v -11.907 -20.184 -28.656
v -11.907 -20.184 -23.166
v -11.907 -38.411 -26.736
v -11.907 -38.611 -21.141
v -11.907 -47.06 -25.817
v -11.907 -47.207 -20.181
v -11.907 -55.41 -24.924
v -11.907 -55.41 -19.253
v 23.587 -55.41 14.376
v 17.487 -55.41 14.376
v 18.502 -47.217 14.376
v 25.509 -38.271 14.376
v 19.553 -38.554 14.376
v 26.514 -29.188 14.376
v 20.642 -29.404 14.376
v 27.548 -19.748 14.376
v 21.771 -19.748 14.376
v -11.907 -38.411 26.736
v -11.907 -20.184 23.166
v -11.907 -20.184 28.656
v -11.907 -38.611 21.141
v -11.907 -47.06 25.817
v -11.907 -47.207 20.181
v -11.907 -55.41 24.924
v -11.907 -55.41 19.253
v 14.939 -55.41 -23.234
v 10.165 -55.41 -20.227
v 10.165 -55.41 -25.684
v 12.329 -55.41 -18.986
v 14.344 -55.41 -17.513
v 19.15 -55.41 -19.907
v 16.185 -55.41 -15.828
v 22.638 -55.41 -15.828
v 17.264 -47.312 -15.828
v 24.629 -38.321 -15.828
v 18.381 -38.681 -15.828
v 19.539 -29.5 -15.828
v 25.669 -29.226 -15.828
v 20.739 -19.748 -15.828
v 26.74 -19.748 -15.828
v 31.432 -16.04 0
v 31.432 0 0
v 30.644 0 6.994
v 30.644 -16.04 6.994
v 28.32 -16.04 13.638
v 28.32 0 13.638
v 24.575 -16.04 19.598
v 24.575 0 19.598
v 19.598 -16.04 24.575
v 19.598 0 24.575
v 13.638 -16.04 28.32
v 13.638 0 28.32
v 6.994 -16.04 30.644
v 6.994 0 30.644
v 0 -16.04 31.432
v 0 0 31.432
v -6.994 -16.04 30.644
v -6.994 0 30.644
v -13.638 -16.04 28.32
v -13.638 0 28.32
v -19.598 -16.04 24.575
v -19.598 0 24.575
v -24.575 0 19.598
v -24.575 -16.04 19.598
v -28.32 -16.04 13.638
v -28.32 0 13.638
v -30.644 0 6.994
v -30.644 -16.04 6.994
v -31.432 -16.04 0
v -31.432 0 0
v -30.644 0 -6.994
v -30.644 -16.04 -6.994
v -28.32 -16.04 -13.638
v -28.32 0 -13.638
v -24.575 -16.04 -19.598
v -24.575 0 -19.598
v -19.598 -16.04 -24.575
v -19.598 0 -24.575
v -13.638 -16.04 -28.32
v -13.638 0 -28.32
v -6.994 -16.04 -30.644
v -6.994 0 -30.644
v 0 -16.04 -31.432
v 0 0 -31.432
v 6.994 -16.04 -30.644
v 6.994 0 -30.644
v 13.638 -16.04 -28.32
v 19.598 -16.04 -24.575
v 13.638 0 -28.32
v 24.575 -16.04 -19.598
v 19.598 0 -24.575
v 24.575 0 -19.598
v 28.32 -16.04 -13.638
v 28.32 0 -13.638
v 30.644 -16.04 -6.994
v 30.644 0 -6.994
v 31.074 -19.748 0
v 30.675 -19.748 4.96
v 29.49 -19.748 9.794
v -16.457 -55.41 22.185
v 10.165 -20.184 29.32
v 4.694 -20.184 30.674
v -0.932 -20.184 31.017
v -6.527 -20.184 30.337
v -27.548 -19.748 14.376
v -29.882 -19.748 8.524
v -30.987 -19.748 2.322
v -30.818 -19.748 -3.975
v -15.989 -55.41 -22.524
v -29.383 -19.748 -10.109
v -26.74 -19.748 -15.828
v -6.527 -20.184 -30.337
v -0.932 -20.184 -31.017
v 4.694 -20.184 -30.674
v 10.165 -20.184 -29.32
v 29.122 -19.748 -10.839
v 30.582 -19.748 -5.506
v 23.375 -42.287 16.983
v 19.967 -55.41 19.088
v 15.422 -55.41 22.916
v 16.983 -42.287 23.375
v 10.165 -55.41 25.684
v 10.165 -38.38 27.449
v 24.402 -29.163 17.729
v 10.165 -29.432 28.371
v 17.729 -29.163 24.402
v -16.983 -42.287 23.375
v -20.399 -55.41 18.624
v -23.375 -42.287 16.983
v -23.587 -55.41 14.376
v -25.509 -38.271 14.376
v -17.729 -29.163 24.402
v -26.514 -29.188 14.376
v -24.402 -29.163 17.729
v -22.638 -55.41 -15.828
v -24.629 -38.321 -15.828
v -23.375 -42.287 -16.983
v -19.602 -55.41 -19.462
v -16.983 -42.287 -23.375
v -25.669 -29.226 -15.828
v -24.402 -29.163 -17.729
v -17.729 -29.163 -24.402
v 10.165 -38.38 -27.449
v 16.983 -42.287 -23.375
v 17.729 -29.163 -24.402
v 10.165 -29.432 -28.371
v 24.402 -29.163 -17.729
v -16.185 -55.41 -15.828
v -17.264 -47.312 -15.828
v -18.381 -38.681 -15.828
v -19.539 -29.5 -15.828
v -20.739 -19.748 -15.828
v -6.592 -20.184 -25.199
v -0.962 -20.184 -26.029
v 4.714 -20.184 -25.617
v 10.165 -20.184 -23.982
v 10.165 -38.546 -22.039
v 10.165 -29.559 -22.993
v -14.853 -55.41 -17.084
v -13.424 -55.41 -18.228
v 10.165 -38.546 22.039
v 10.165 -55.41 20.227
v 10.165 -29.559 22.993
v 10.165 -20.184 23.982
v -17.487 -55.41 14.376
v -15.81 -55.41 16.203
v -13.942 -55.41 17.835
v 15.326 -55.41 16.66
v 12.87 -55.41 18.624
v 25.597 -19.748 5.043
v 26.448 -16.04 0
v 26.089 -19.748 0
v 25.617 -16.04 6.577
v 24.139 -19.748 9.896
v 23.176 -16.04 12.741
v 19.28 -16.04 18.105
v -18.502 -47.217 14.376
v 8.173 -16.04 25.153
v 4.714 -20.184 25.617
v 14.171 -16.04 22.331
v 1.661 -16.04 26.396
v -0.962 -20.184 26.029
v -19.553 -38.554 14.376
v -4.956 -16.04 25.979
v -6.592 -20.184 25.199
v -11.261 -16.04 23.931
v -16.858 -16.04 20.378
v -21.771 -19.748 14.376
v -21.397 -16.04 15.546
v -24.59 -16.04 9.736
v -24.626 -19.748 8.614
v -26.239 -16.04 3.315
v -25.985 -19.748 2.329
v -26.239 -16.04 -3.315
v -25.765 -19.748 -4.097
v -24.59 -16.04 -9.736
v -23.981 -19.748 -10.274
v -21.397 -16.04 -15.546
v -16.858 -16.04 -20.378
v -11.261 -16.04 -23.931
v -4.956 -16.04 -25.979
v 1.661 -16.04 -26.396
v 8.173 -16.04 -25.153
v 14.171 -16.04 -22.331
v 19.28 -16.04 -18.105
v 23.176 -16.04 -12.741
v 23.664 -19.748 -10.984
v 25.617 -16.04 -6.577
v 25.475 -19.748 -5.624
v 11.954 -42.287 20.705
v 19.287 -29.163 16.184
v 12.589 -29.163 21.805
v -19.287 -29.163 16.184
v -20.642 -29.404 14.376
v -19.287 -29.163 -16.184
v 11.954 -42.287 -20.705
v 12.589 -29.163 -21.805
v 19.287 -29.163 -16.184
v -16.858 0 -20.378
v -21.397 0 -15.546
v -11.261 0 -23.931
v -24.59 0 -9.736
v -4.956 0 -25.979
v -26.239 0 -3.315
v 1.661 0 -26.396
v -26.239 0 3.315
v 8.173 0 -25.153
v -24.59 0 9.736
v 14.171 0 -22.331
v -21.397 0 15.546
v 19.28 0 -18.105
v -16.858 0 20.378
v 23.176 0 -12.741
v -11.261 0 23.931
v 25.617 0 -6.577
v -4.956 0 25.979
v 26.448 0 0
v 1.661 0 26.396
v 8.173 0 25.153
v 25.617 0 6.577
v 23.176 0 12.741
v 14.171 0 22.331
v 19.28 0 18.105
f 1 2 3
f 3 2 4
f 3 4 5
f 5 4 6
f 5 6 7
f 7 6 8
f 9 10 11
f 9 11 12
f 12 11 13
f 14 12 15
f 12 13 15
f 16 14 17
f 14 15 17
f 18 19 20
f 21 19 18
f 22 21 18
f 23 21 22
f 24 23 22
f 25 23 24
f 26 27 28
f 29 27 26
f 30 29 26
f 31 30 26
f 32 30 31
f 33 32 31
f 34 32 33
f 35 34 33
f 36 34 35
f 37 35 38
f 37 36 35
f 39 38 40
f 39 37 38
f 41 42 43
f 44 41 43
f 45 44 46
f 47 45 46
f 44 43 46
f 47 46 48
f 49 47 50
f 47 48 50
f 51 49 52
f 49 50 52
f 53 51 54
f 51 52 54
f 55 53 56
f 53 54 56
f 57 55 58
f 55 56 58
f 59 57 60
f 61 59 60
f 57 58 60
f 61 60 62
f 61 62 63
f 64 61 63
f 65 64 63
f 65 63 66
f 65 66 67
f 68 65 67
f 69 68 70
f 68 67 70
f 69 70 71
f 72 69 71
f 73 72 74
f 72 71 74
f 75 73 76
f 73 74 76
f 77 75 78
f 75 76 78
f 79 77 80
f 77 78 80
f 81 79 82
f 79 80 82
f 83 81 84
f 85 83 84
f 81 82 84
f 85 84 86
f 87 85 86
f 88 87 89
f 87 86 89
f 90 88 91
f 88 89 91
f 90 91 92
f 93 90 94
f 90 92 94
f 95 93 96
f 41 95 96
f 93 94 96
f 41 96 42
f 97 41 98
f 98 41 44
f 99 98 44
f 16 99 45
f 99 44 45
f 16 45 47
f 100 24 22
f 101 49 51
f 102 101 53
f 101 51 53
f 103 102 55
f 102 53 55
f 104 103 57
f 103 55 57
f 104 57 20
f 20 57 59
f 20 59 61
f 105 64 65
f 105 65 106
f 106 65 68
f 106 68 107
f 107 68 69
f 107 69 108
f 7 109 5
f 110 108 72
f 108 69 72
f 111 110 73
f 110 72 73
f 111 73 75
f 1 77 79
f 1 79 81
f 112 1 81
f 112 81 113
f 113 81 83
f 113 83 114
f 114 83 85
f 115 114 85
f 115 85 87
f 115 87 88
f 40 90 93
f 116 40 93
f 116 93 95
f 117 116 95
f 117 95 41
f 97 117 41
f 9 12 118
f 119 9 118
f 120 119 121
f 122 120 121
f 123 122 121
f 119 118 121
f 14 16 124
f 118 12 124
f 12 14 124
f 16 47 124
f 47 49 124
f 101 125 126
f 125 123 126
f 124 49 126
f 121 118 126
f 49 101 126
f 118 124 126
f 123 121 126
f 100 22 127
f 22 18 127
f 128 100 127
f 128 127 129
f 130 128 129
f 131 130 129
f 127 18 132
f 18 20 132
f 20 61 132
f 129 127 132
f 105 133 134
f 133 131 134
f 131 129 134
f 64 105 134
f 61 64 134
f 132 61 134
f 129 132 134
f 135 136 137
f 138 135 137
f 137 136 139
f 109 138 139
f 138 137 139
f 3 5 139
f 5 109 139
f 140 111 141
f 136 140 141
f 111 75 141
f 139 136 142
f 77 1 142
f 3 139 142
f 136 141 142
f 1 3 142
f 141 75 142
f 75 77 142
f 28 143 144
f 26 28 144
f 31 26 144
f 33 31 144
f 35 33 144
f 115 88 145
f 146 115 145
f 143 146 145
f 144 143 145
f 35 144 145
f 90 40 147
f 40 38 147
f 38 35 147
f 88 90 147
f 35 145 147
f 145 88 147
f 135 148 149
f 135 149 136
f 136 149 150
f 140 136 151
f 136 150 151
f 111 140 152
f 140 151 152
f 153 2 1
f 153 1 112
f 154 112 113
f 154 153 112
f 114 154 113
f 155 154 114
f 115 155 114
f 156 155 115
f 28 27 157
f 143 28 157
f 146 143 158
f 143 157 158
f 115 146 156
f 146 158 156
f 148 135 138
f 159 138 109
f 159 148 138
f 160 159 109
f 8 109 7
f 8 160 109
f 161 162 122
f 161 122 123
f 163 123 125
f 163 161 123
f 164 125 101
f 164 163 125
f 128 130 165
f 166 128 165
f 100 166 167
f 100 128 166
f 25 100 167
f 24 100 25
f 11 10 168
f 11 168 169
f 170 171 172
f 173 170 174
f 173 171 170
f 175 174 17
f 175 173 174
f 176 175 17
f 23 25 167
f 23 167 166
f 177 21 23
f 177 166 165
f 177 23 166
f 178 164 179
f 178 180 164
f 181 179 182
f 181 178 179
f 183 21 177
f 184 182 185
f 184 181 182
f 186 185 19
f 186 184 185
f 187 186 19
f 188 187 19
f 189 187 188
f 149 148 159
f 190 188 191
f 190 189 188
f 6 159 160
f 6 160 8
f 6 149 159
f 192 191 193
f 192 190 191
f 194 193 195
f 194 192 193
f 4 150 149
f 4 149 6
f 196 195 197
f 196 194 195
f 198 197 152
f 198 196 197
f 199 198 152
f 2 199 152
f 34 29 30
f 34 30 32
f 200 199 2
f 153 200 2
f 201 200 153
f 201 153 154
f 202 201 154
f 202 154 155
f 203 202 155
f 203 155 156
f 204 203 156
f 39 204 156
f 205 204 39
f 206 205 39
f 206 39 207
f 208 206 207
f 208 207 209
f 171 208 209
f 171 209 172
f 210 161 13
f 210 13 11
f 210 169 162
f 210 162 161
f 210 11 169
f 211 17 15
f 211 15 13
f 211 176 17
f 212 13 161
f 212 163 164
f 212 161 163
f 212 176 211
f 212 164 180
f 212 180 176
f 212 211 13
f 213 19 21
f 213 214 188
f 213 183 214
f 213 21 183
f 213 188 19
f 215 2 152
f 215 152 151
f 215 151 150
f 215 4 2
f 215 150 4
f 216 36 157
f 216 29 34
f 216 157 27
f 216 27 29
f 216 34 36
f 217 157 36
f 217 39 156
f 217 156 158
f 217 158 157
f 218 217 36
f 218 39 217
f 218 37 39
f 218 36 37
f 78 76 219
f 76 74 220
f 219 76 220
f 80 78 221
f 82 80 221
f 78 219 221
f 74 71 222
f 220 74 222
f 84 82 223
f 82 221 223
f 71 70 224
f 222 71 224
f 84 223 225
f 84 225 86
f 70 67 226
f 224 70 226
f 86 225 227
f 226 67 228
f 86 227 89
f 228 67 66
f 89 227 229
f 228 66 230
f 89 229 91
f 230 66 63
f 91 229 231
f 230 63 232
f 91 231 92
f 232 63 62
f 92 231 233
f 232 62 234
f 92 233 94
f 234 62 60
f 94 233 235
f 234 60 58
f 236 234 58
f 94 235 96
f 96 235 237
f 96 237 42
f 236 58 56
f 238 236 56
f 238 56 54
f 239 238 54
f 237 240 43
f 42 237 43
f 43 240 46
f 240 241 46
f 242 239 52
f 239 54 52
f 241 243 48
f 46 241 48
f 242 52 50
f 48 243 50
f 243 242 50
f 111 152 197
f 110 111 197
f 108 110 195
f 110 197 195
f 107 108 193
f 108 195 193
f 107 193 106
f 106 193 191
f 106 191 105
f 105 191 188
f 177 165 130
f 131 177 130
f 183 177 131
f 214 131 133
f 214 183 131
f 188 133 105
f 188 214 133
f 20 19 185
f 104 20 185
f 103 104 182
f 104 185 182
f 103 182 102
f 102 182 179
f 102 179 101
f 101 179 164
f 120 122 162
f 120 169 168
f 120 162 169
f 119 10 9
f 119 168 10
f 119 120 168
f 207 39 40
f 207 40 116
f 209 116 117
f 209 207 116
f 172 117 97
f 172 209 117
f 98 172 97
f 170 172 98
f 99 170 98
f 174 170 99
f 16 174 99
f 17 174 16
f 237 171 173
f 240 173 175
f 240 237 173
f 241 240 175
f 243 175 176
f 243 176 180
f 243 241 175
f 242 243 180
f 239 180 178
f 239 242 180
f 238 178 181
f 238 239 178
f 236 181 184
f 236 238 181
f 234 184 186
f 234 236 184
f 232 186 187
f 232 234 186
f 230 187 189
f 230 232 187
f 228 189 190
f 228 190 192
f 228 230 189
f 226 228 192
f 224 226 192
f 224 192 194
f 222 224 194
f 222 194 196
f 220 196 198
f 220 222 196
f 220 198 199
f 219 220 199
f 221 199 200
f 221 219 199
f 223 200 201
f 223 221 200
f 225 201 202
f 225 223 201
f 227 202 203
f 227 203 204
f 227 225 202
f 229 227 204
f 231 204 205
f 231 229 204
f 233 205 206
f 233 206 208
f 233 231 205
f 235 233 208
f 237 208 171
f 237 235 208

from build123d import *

# Parameters (mm, degrees)
F0_R           = 26.44775
F1_DEPTH       = 55.4101
F2_SIZE2       = 39.37
F2_SIZE        = 3.81
F3_R           = 31.4325
F4_DEPTH       = 55.4101
F5_SIZE2       = 39.37
F5_SIZE        = 3.81
F7_W           = 10.4550290853
F7_H           = 15.8277489245
F7_H_2         = 14.3756624311
F8_DEPTH       = 43.9235
F8_DEPTH_BACK  = 42.42753
F9_W           = 22.0717256889
F9_H           = 9.8741929978
F9_H_2         = 31.5537750721
F10_DEPTH      = 52.69923
F10_DEPTH_BACK = 50.37589


with BuildPart() as f1:
    # F0 (on Front) → F1 (new body)
    with BuildSketch(Plane.XZ):
        Circle(F0_R)
    extrude(amount=F1_DEPTH)

    # F2
    f2_edges = [f1.edges().sort_by_distance(p)[0] for p in [
        (-26.44775, -55.4101, 0),
    ]]
    f2_side = f1.faces().sort_by_distance((0, -55.4101, 0))[0]
    chamfer(f2_edges, length=F2_SIZE, length2=F2_SIZE2, reference=f2_side)


with BuildPart() as f4:
    # F3 (on Front) → F4 (new body)
    with BuildSketch(Plane.XZ):
        Circle(F3_R)
    extrude(amount=F4_DEPTH)

    # F5
    f5_edges = [f4.edges().sort_by_distance(p)[0] for p in [
        (-31.4325, -55.4101, 0),
    ]]
    f5_side = f4.faces().sort_by_distance((0, -55.4101, 0))[0]
    chamfer(f5_edges, length=F5_SIZE, length2=F5_SIZE2, reference=f5_side)

    # F6: cut F1
    add(f1.part, mode=Mode.SUBTRACT)

    # F7 (on Right) → F8 (cut, two sides)
    with BuildSketch(Plane.YZ) as f8_sk:
        with Locations((-24.9758986756, -7.9138744622)):
            Rectangle(F7_W, F7_H)
        with Locations((-24.9758986756, 7.1878312156)):
            Rectangle(F7_W, F7_H_2)
        Polygon((-30.2034132183, -15.8277489245), (-30.2034132183, 0), (-30.2034132183, 14.3756624311), (-65.0081411004, 14.3756624311), (-65.0081411004, -15.8277489245), align=None)
    extrude(amount=F8_DEPTH, mode=Mode.SUBTRACT)
    extrude(f8_sk.sketch, amount=-F8_DEPTH_BACK, mode=Mode.SUBTRACT)

    # F9 (on Top) → F10 (cut, two sides)
    with BuildSketch(Plane.XY) as f10_sk:
        with Locations((-0.8712508716, -25.1211086288)):
            Rectangle(F9_W, F9_H)
        with Locations((-0.8712508716, -45.8350926638)):
            Rectangle(F9_W, F9_H_2)
    extrude(amount=F10_DEPTH, mode=Mode.SUBTRACT)
    extrude(f10_sk.sketch, amount=-F10_DEPTH_BACK, mode=Mode.SUBTRACT)


solid = f4.part
